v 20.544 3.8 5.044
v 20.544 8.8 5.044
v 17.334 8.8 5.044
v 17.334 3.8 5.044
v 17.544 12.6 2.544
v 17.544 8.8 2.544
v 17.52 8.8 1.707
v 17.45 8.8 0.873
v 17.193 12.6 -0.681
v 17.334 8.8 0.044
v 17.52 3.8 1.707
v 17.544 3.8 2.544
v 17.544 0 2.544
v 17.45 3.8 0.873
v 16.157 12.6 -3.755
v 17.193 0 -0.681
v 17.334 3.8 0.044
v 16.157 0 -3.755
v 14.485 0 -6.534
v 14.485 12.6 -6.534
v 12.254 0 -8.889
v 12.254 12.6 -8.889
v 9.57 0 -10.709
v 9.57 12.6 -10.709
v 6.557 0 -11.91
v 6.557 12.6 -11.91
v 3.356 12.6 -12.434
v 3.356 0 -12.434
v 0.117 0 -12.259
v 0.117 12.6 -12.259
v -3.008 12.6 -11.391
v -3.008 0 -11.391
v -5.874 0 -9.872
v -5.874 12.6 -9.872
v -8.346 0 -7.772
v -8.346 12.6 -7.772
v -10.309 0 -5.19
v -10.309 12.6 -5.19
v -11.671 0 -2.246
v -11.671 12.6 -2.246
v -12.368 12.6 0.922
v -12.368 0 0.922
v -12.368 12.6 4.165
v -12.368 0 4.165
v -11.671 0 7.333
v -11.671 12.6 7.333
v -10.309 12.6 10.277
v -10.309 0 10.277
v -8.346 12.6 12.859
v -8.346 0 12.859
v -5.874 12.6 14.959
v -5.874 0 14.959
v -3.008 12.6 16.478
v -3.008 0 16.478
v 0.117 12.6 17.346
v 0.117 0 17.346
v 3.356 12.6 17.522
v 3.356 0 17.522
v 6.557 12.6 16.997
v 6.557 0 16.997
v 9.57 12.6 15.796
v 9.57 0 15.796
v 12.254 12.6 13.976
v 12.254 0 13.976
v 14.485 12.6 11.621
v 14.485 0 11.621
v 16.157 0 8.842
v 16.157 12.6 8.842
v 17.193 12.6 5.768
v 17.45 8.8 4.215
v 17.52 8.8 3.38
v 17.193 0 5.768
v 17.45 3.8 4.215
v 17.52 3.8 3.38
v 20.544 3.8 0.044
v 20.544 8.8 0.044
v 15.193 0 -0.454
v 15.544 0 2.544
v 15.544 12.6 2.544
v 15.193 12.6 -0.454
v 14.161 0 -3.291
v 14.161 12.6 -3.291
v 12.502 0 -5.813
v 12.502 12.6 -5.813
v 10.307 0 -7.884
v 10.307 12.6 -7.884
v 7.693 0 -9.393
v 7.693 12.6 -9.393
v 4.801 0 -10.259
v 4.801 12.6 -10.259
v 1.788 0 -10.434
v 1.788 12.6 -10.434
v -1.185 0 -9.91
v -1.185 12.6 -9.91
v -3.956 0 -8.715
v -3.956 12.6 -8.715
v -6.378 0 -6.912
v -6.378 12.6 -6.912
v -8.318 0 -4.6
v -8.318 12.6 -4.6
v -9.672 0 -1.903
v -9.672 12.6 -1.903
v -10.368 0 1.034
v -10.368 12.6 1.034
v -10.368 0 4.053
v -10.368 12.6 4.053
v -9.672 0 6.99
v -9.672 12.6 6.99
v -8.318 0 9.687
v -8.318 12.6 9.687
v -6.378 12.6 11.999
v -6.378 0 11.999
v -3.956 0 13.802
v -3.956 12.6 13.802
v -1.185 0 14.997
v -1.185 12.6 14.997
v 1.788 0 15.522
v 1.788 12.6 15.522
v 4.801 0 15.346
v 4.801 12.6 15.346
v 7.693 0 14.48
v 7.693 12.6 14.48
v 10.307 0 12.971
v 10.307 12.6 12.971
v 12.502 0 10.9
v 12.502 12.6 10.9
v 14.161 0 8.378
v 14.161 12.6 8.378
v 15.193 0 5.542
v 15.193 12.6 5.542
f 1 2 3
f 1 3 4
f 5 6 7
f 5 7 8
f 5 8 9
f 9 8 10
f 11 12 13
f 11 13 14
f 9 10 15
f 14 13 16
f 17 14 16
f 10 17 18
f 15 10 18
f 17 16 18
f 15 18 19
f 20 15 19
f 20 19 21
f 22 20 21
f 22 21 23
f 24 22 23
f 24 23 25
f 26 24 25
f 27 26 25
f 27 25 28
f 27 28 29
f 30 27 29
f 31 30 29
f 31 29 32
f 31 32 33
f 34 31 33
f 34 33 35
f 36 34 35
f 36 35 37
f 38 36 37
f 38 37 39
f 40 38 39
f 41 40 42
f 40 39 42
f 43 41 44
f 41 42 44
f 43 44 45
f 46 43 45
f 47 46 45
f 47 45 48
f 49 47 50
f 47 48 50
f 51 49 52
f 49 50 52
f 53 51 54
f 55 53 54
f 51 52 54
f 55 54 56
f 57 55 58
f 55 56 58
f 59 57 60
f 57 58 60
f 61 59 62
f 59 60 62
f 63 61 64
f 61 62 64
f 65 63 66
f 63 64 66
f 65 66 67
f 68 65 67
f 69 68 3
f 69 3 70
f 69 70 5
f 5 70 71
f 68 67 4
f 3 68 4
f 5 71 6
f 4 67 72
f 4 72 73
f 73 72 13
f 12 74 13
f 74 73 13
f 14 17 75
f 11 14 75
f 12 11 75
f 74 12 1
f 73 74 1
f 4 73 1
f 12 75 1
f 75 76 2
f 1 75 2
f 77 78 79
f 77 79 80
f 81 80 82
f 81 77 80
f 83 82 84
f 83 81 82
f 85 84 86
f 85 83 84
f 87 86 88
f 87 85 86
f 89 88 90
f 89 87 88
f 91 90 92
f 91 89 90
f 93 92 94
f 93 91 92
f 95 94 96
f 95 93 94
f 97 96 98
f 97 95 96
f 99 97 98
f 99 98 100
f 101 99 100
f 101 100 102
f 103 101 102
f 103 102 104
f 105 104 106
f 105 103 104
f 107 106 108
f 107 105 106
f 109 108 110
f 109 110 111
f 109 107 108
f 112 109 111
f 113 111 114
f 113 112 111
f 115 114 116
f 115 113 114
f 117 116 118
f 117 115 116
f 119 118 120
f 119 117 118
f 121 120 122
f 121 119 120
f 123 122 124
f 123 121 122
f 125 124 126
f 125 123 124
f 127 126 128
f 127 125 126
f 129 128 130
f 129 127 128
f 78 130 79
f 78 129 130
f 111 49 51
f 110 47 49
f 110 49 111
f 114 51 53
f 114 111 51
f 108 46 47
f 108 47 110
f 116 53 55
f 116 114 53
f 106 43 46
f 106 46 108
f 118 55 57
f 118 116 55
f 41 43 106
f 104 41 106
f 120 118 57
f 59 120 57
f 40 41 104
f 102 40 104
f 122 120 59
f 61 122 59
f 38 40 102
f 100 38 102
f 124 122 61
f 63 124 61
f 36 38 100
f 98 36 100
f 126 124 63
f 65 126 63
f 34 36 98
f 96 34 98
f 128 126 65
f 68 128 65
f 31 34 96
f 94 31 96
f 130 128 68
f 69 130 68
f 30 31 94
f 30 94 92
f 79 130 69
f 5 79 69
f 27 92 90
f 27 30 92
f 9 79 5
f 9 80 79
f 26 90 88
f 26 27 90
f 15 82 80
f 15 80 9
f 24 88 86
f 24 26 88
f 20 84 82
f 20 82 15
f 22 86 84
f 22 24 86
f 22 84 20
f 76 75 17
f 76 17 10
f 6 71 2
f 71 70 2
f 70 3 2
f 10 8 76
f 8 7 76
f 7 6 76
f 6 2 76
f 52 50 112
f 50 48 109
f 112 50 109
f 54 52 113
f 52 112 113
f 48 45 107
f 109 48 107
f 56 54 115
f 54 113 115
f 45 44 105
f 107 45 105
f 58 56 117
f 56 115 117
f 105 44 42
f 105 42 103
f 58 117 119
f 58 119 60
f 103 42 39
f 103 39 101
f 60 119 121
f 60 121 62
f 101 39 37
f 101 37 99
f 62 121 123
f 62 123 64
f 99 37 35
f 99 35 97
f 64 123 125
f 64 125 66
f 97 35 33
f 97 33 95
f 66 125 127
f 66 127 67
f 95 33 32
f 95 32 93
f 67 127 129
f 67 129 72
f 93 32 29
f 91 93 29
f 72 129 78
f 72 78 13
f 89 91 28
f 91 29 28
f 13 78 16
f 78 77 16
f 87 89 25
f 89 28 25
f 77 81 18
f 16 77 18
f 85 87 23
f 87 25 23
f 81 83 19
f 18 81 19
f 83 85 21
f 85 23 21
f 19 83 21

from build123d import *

# Parameters (mm, degrees)
SKETCH1_R                = 15
SKETCH1_R_2              = 13
BOSS_EXTRUDE2_DEPTH      = 12.6
BOSS_EXTRUDE3_DEPTH      = 3
BOSS_EXTRUDE3_DEPTH_BACK = 1


with BuildPart() as part:
    # Sketch1 → Boss-Extrude2 (new body)
    with BuildSketch(Plane(origin=(0, 0, 0), x_dir=(1, 0, 0), z_dir=(0, 1, 0))):
        with Locations((2.543609681, -2.543609681)):
            Circle(SKETCH1_R)
        with Locations((2.543609681, -2.543609681)):
            Circle(SKETCH1_R_2, mode=Mode.SUBTRACT)
    extrude(amount=BOSS_EXTRUDE2_DEPTH)

    # Sketch3 → Boss-Extrude3 (add, two sides)
    with BuildSketch(Plane(origin=(17.543609681, 0, 0), x_dir=(0, 0, -1), z_dir=(1, 0, 0))) as boss_extrude3_sk:
        Polygon((-5.043609681, 6.3), (-5.043609681, 8.8), (-0.043609681, 8.8), (-0.043609681, 6.3), (-0.043609681, 3.8), (-5.043609681, 3.8), align=None)
    extrude(amount=BOSS_EXTRUDE3_DEPTH)
    extrude(boss_extrude3_sk.sketch, amount=-BOSS_EXTRUDE3_DEPTH_BACK)


solid = part.part
